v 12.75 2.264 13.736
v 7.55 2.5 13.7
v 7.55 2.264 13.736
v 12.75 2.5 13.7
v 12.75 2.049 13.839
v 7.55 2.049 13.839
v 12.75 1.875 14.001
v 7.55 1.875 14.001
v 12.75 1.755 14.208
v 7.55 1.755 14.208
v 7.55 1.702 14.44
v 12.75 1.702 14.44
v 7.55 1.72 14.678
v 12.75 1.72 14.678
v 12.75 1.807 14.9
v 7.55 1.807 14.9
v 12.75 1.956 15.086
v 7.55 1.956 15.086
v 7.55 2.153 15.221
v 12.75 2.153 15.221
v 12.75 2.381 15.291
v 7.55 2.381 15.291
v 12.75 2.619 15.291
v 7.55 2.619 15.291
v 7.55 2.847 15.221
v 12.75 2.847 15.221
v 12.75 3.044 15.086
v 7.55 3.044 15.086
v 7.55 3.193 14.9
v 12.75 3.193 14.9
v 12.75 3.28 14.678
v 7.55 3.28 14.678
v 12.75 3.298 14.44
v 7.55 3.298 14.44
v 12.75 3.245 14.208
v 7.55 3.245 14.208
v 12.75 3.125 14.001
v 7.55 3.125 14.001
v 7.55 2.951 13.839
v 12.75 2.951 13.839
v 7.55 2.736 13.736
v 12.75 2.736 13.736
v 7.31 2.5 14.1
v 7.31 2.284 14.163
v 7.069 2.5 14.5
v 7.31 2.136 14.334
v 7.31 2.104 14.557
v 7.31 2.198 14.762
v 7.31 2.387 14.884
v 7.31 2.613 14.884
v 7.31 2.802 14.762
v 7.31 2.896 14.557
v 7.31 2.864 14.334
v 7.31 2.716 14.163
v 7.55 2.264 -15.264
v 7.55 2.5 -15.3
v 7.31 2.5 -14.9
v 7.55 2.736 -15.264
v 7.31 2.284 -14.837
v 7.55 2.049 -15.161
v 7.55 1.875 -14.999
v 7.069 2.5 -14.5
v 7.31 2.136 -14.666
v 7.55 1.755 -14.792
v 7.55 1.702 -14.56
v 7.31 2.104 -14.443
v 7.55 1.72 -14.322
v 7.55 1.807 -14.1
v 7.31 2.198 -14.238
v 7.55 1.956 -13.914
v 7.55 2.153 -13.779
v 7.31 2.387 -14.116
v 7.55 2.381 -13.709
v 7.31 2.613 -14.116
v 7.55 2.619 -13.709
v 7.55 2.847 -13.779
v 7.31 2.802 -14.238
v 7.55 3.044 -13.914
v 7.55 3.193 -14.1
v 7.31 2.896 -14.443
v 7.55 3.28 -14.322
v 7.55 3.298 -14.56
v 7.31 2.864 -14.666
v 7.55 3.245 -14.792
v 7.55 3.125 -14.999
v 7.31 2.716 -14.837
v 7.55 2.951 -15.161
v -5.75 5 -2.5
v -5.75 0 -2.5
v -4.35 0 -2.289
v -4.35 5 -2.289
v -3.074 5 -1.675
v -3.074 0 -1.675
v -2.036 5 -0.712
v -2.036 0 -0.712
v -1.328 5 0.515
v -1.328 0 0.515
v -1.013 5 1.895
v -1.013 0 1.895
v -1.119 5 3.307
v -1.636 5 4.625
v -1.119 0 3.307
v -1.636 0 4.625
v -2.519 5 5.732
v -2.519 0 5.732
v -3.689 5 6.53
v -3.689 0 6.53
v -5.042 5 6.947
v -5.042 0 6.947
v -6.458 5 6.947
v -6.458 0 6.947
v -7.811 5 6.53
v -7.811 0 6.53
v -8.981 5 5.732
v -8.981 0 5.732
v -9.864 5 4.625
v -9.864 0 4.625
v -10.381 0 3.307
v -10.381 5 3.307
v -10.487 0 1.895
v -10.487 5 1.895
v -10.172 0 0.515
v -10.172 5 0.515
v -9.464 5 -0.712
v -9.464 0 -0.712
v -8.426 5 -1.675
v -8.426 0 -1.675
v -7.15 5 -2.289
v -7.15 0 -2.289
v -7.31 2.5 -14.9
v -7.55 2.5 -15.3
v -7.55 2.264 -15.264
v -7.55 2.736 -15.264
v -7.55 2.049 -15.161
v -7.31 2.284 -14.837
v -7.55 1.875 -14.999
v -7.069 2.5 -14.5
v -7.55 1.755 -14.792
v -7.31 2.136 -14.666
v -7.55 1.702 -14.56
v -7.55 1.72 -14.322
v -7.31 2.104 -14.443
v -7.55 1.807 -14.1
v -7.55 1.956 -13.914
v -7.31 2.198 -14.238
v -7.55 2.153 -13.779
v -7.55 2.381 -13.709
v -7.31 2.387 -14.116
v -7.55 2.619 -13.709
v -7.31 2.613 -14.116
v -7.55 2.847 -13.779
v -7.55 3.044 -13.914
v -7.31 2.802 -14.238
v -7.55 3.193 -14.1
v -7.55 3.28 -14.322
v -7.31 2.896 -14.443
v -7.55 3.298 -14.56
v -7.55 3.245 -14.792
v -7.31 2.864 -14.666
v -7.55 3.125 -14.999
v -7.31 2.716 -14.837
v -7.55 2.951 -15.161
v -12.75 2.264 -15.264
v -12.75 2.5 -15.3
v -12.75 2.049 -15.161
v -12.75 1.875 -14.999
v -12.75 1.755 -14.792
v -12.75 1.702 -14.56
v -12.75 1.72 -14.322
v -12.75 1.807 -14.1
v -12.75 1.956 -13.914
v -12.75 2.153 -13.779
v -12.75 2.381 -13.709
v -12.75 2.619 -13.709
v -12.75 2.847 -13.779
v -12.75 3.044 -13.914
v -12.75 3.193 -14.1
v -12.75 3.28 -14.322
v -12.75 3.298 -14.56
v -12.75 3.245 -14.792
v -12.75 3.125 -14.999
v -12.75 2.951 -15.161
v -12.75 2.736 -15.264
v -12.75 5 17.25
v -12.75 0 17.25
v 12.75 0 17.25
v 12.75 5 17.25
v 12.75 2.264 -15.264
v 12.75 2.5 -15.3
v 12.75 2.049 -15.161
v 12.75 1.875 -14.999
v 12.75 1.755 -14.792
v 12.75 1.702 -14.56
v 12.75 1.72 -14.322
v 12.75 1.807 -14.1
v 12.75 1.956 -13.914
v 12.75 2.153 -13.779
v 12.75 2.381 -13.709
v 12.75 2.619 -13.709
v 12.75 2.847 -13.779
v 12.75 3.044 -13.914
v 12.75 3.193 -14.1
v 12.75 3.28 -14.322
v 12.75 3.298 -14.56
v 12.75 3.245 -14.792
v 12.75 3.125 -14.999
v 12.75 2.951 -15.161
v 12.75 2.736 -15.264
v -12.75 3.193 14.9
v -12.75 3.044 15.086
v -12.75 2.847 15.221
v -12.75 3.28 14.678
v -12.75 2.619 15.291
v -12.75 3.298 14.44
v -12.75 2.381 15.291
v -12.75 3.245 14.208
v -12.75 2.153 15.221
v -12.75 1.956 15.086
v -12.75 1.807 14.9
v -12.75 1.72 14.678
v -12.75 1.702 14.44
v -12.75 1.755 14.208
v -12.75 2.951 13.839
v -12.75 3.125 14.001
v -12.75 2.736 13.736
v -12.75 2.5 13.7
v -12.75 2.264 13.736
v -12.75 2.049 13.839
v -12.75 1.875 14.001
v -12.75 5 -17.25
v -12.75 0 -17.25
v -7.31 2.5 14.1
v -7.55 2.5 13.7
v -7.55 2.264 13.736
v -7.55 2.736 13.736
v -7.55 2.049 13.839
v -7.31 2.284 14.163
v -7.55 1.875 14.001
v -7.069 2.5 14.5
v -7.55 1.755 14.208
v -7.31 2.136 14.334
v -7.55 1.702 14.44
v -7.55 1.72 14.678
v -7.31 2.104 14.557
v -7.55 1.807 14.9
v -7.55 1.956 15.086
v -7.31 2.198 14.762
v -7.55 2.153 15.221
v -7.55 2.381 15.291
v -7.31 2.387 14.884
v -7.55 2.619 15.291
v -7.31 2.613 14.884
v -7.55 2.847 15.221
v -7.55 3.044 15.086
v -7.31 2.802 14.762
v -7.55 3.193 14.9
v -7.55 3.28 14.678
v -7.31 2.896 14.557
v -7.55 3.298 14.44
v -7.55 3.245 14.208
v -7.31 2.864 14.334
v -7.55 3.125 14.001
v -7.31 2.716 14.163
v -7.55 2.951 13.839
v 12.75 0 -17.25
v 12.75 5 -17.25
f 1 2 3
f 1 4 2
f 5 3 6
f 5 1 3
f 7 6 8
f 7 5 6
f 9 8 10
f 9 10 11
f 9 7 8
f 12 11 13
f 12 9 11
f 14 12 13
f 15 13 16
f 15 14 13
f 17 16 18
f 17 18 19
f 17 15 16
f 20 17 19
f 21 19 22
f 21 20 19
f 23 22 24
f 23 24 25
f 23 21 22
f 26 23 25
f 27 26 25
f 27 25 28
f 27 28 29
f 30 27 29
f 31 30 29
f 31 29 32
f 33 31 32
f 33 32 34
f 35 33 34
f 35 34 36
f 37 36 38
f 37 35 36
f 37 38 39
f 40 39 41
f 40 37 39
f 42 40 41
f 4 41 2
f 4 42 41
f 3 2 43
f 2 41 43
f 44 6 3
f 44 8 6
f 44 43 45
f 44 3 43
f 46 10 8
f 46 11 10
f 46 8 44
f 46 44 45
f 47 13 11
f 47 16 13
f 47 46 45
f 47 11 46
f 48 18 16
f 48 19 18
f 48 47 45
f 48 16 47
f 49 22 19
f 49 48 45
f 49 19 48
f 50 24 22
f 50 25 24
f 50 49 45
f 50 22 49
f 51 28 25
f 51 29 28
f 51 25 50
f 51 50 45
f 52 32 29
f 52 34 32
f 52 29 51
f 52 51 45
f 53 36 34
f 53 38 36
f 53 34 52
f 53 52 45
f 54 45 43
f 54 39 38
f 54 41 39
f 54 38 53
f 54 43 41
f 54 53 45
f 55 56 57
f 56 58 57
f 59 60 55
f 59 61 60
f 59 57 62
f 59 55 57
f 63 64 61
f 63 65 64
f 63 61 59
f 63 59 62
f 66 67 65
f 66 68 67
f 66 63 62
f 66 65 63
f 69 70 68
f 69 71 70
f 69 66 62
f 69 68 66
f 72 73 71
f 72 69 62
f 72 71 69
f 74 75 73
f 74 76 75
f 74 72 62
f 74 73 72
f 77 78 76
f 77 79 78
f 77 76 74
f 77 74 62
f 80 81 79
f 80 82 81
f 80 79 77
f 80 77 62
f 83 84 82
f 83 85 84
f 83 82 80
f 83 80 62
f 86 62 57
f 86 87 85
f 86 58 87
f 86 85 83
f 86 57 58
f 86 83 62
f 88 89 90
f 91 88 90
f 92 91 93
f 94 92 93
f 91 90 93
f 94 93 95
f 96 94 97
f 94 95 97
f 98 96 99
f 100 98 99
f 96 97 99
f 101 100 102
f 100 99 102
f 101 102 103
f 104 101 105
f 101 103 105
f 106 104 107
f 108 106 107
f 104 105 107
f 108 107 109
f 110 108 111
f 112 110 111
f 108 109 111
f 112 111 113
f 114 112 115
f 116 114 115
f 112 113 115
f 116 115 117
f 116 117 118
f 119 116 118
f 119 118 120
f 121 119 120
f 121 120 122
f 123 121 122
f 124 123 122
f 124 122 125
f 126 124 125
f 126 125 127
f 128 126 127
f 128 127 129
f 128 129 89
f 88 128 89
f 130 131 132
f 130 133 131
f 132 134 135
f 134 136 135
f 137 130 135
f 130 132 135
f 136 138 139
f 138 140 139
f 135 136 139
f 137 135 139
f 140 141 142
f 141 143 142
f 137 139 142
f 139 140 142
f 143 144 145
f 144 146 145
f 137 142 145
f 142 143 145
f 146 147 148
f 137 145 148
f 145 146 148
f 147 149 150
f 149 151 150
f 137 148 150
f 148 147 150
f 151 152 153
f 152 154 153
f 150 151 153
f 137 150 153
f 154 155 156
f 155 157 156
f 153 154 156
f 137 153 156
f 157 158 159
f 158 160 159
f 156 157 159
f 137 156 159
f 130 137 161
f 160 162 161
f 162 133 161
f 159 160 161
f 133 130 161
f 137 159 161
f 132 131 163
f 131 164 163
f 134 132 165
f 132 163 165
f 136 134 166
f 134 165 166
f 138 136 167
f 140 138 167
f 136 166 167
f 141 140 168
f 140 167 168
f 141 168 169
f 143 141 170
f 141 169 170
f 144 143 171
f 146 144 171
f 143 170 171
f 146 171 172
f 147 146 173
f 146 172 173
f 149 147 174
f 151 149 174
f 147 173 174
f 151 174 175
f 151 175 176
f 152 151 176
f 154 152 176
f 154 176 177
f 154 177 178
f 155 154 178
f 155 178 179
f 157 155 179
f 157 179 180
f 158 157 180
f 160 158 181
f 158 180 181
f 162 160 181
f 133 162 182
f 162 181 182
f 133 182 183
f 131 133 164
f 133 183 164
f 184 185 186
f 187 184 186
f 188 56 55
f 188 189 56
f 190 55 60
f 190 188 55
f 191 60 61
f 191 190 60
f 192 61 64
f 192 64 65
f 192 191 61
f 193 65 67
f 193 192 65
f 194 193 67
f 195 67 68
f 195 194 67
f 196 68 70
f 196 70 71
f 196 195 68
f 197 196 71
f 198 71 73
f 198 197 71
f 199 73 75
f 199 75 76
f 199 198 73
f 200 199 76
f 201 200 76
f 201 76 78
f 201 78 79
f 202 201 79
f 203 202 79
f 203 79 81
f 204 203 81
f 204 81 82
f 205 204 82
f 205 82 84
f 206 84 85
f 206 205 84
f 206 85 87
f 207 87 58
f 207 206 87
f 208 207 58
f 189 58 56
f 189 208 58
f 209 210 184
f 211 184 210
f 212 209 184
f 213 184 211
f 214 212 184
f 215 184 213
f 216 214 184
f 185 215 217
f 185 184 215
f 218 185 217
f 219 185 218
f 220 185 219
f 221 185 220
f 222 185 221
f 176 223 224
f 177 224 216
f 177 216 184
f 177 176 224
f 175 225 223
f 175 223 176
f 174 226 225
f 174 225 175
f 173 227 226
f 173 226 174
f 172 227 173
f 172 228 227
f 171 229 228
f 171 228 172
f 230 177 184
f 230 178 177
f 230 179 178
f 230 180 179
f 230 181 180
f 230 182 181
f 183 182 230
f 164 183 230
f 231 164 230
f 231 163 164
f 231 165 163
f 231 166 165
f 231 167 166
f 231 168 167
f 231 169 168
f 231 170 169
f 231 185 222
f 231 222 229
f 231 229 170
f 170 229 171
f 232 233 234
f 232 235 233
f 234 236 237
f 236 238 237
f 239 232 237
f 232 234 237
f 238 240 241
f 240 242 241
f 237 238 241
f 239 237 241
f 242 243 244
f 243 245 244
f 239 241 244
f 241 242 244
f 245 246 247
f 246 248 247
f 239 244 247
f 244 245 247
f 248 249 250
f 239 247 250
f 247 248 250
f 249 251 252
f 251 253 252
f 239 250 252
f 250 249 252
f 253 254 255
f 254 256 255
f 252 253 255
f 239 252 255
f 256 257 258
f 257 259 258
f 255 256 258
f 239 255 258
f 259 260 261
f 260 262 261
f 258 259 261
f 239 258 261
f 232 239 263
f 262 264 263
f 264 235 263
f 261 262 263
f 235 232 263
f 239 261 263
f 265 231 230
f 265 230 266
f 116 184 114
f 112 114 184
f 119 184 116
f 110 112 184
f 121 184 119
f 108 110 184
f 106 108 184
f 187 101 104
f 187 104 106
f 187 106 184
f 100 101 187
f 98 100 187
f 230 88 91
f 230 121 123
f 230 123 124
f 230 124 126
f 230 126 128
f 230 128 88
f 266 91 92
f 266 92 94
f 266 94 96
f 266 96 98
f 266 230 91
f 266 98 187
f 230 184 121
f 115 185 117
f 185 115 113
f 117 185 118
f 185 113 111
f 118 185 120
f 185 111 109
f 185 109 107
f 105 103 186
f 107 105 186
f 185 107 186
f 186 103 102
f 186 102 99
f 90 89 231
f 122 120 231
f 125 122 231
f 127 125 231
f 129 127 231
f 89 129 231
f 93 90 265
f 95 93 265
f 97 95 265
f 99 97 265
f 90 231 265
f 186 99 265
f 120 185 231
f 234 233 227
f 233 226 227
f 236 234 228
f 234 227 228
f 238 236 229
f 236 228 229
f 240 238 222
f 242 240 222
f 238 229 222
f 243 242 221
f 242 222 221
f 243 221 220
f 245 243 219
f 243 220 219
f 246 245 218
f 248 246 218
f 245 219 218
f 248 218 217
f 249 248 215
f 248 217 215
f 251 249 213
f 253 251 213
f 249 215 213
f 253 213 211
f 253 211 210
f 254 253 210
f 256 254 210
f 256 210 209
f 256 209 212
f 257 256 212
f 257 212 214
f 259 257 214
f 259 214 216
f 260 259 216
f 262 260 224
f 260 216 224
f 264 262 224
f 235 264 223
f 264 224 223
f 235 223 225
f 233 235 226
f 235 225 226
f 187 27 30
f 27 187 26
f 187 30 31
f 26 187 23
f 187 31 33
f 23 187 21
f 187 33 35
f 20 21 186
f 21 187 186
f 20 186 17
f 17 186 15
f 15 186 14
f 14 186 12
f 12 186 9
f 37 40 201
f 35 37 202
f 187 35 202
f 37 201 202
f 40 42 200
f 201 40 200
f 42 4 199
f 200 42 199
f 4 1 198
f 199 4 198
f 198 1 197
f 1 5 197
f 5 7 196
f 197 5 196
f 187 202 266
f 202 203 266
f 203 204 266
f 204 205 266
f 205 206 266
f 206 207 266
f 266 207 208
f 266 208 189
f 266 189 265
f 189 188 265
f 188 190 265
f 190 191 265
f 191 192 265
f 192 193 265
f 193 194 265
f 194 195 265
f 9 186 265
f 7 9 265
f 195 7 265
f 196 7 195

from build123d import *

# Parameters (mm, degrees)
SKETCH_1_W          = 25.5
SKETCH_1_H          = 34.5
EXTRUDE_1_DEPTH     = 5
M2X0_4_1_AT_2_COUNT = 2
M2X0_4_1_AT_2_PITCH = 29
SKETCH_4_R          = 4.75
CUT_EXTRUDE_1_DEPTH = 23.025553342


with BuildPart() as part:
    # 草图1 → 凸台-拉伸1 (new body)
    with BuildSketch(Plane(origin=(0, 0, 0), x_dir=(1, 0, 0), z_dir=(0, 1, 0))):
        Rectangle(SKETCH_1_W, SKETCH_1_H)
    extrude(amount=EXTRUDE_1_DEPTH)

    # 草图3 → M2x0.4 螺纹孔1 (revolve, cut)
    with BuildSketch(Plane(origin=(12.75, 2.5, -14.5), x_dir=(0, 0, -1), z_dir=(0, 1, 0))):
        Polygon((0, 0), (0, 5.680688495), (0.8, 5.2), (0.8, 0), align=None)
    m2x0_4_1 = revolve(axis=Axis((19.1, 2.5, -14.5), (-1, 0, 0)), mode=Mode.SUBTRACT)

    # M2x0.4 螺纹孔1 at 2: M2x0.4 螺纹孔1 ×2
    with Locations(*[(0, 0, i * M2X0_4_1_AT_2_PITCH) for i in range(1, M2X0_4_1_AT_2_COUNT)]):
        add(m2x0_4_1, mode=Mode.SUBTRACT)

    # 镜向1: M2x0.4 螺纹孔1 across plane
    add(m2x0_4_1.mirror(Plane(origin=(0, 0, 0), x_dir=(0, 0, 1), z_dir=(1, 0, 0))), mode=Mode.SUBTRACT)

    # 镜向1 copy 1 sketch → 镜向1 copy 1 (revolve, cut)
    with BuildSketch(Plane(origin=(-12.75, 2.5, 14.5), x_dir=(0, 0, -1), z_dir=(0, 1, 0))):
        Polygon((0, 0), (0, -5.680688495), (0.8, -5.2), (0.8, 0), align=None)
    revolve(axis=Axis((-19.1, 2.5, 14.5), (-1, 0, 0)), mode=Mode.SUBTRACT)

    # 草图4 → 切除-拉伸1 (cut, through all)
    with BuildSketch(Plane.XZ):
        with Locations(Location((-5.75, 2.25, 0), (0, 0, 270))):
            Circle(SKETCH_4_R)
    extrude(amount=-CUT_EXTRUDE_1_DEPTH, mode=Mode.SUBTRACT)


solid = part.part
